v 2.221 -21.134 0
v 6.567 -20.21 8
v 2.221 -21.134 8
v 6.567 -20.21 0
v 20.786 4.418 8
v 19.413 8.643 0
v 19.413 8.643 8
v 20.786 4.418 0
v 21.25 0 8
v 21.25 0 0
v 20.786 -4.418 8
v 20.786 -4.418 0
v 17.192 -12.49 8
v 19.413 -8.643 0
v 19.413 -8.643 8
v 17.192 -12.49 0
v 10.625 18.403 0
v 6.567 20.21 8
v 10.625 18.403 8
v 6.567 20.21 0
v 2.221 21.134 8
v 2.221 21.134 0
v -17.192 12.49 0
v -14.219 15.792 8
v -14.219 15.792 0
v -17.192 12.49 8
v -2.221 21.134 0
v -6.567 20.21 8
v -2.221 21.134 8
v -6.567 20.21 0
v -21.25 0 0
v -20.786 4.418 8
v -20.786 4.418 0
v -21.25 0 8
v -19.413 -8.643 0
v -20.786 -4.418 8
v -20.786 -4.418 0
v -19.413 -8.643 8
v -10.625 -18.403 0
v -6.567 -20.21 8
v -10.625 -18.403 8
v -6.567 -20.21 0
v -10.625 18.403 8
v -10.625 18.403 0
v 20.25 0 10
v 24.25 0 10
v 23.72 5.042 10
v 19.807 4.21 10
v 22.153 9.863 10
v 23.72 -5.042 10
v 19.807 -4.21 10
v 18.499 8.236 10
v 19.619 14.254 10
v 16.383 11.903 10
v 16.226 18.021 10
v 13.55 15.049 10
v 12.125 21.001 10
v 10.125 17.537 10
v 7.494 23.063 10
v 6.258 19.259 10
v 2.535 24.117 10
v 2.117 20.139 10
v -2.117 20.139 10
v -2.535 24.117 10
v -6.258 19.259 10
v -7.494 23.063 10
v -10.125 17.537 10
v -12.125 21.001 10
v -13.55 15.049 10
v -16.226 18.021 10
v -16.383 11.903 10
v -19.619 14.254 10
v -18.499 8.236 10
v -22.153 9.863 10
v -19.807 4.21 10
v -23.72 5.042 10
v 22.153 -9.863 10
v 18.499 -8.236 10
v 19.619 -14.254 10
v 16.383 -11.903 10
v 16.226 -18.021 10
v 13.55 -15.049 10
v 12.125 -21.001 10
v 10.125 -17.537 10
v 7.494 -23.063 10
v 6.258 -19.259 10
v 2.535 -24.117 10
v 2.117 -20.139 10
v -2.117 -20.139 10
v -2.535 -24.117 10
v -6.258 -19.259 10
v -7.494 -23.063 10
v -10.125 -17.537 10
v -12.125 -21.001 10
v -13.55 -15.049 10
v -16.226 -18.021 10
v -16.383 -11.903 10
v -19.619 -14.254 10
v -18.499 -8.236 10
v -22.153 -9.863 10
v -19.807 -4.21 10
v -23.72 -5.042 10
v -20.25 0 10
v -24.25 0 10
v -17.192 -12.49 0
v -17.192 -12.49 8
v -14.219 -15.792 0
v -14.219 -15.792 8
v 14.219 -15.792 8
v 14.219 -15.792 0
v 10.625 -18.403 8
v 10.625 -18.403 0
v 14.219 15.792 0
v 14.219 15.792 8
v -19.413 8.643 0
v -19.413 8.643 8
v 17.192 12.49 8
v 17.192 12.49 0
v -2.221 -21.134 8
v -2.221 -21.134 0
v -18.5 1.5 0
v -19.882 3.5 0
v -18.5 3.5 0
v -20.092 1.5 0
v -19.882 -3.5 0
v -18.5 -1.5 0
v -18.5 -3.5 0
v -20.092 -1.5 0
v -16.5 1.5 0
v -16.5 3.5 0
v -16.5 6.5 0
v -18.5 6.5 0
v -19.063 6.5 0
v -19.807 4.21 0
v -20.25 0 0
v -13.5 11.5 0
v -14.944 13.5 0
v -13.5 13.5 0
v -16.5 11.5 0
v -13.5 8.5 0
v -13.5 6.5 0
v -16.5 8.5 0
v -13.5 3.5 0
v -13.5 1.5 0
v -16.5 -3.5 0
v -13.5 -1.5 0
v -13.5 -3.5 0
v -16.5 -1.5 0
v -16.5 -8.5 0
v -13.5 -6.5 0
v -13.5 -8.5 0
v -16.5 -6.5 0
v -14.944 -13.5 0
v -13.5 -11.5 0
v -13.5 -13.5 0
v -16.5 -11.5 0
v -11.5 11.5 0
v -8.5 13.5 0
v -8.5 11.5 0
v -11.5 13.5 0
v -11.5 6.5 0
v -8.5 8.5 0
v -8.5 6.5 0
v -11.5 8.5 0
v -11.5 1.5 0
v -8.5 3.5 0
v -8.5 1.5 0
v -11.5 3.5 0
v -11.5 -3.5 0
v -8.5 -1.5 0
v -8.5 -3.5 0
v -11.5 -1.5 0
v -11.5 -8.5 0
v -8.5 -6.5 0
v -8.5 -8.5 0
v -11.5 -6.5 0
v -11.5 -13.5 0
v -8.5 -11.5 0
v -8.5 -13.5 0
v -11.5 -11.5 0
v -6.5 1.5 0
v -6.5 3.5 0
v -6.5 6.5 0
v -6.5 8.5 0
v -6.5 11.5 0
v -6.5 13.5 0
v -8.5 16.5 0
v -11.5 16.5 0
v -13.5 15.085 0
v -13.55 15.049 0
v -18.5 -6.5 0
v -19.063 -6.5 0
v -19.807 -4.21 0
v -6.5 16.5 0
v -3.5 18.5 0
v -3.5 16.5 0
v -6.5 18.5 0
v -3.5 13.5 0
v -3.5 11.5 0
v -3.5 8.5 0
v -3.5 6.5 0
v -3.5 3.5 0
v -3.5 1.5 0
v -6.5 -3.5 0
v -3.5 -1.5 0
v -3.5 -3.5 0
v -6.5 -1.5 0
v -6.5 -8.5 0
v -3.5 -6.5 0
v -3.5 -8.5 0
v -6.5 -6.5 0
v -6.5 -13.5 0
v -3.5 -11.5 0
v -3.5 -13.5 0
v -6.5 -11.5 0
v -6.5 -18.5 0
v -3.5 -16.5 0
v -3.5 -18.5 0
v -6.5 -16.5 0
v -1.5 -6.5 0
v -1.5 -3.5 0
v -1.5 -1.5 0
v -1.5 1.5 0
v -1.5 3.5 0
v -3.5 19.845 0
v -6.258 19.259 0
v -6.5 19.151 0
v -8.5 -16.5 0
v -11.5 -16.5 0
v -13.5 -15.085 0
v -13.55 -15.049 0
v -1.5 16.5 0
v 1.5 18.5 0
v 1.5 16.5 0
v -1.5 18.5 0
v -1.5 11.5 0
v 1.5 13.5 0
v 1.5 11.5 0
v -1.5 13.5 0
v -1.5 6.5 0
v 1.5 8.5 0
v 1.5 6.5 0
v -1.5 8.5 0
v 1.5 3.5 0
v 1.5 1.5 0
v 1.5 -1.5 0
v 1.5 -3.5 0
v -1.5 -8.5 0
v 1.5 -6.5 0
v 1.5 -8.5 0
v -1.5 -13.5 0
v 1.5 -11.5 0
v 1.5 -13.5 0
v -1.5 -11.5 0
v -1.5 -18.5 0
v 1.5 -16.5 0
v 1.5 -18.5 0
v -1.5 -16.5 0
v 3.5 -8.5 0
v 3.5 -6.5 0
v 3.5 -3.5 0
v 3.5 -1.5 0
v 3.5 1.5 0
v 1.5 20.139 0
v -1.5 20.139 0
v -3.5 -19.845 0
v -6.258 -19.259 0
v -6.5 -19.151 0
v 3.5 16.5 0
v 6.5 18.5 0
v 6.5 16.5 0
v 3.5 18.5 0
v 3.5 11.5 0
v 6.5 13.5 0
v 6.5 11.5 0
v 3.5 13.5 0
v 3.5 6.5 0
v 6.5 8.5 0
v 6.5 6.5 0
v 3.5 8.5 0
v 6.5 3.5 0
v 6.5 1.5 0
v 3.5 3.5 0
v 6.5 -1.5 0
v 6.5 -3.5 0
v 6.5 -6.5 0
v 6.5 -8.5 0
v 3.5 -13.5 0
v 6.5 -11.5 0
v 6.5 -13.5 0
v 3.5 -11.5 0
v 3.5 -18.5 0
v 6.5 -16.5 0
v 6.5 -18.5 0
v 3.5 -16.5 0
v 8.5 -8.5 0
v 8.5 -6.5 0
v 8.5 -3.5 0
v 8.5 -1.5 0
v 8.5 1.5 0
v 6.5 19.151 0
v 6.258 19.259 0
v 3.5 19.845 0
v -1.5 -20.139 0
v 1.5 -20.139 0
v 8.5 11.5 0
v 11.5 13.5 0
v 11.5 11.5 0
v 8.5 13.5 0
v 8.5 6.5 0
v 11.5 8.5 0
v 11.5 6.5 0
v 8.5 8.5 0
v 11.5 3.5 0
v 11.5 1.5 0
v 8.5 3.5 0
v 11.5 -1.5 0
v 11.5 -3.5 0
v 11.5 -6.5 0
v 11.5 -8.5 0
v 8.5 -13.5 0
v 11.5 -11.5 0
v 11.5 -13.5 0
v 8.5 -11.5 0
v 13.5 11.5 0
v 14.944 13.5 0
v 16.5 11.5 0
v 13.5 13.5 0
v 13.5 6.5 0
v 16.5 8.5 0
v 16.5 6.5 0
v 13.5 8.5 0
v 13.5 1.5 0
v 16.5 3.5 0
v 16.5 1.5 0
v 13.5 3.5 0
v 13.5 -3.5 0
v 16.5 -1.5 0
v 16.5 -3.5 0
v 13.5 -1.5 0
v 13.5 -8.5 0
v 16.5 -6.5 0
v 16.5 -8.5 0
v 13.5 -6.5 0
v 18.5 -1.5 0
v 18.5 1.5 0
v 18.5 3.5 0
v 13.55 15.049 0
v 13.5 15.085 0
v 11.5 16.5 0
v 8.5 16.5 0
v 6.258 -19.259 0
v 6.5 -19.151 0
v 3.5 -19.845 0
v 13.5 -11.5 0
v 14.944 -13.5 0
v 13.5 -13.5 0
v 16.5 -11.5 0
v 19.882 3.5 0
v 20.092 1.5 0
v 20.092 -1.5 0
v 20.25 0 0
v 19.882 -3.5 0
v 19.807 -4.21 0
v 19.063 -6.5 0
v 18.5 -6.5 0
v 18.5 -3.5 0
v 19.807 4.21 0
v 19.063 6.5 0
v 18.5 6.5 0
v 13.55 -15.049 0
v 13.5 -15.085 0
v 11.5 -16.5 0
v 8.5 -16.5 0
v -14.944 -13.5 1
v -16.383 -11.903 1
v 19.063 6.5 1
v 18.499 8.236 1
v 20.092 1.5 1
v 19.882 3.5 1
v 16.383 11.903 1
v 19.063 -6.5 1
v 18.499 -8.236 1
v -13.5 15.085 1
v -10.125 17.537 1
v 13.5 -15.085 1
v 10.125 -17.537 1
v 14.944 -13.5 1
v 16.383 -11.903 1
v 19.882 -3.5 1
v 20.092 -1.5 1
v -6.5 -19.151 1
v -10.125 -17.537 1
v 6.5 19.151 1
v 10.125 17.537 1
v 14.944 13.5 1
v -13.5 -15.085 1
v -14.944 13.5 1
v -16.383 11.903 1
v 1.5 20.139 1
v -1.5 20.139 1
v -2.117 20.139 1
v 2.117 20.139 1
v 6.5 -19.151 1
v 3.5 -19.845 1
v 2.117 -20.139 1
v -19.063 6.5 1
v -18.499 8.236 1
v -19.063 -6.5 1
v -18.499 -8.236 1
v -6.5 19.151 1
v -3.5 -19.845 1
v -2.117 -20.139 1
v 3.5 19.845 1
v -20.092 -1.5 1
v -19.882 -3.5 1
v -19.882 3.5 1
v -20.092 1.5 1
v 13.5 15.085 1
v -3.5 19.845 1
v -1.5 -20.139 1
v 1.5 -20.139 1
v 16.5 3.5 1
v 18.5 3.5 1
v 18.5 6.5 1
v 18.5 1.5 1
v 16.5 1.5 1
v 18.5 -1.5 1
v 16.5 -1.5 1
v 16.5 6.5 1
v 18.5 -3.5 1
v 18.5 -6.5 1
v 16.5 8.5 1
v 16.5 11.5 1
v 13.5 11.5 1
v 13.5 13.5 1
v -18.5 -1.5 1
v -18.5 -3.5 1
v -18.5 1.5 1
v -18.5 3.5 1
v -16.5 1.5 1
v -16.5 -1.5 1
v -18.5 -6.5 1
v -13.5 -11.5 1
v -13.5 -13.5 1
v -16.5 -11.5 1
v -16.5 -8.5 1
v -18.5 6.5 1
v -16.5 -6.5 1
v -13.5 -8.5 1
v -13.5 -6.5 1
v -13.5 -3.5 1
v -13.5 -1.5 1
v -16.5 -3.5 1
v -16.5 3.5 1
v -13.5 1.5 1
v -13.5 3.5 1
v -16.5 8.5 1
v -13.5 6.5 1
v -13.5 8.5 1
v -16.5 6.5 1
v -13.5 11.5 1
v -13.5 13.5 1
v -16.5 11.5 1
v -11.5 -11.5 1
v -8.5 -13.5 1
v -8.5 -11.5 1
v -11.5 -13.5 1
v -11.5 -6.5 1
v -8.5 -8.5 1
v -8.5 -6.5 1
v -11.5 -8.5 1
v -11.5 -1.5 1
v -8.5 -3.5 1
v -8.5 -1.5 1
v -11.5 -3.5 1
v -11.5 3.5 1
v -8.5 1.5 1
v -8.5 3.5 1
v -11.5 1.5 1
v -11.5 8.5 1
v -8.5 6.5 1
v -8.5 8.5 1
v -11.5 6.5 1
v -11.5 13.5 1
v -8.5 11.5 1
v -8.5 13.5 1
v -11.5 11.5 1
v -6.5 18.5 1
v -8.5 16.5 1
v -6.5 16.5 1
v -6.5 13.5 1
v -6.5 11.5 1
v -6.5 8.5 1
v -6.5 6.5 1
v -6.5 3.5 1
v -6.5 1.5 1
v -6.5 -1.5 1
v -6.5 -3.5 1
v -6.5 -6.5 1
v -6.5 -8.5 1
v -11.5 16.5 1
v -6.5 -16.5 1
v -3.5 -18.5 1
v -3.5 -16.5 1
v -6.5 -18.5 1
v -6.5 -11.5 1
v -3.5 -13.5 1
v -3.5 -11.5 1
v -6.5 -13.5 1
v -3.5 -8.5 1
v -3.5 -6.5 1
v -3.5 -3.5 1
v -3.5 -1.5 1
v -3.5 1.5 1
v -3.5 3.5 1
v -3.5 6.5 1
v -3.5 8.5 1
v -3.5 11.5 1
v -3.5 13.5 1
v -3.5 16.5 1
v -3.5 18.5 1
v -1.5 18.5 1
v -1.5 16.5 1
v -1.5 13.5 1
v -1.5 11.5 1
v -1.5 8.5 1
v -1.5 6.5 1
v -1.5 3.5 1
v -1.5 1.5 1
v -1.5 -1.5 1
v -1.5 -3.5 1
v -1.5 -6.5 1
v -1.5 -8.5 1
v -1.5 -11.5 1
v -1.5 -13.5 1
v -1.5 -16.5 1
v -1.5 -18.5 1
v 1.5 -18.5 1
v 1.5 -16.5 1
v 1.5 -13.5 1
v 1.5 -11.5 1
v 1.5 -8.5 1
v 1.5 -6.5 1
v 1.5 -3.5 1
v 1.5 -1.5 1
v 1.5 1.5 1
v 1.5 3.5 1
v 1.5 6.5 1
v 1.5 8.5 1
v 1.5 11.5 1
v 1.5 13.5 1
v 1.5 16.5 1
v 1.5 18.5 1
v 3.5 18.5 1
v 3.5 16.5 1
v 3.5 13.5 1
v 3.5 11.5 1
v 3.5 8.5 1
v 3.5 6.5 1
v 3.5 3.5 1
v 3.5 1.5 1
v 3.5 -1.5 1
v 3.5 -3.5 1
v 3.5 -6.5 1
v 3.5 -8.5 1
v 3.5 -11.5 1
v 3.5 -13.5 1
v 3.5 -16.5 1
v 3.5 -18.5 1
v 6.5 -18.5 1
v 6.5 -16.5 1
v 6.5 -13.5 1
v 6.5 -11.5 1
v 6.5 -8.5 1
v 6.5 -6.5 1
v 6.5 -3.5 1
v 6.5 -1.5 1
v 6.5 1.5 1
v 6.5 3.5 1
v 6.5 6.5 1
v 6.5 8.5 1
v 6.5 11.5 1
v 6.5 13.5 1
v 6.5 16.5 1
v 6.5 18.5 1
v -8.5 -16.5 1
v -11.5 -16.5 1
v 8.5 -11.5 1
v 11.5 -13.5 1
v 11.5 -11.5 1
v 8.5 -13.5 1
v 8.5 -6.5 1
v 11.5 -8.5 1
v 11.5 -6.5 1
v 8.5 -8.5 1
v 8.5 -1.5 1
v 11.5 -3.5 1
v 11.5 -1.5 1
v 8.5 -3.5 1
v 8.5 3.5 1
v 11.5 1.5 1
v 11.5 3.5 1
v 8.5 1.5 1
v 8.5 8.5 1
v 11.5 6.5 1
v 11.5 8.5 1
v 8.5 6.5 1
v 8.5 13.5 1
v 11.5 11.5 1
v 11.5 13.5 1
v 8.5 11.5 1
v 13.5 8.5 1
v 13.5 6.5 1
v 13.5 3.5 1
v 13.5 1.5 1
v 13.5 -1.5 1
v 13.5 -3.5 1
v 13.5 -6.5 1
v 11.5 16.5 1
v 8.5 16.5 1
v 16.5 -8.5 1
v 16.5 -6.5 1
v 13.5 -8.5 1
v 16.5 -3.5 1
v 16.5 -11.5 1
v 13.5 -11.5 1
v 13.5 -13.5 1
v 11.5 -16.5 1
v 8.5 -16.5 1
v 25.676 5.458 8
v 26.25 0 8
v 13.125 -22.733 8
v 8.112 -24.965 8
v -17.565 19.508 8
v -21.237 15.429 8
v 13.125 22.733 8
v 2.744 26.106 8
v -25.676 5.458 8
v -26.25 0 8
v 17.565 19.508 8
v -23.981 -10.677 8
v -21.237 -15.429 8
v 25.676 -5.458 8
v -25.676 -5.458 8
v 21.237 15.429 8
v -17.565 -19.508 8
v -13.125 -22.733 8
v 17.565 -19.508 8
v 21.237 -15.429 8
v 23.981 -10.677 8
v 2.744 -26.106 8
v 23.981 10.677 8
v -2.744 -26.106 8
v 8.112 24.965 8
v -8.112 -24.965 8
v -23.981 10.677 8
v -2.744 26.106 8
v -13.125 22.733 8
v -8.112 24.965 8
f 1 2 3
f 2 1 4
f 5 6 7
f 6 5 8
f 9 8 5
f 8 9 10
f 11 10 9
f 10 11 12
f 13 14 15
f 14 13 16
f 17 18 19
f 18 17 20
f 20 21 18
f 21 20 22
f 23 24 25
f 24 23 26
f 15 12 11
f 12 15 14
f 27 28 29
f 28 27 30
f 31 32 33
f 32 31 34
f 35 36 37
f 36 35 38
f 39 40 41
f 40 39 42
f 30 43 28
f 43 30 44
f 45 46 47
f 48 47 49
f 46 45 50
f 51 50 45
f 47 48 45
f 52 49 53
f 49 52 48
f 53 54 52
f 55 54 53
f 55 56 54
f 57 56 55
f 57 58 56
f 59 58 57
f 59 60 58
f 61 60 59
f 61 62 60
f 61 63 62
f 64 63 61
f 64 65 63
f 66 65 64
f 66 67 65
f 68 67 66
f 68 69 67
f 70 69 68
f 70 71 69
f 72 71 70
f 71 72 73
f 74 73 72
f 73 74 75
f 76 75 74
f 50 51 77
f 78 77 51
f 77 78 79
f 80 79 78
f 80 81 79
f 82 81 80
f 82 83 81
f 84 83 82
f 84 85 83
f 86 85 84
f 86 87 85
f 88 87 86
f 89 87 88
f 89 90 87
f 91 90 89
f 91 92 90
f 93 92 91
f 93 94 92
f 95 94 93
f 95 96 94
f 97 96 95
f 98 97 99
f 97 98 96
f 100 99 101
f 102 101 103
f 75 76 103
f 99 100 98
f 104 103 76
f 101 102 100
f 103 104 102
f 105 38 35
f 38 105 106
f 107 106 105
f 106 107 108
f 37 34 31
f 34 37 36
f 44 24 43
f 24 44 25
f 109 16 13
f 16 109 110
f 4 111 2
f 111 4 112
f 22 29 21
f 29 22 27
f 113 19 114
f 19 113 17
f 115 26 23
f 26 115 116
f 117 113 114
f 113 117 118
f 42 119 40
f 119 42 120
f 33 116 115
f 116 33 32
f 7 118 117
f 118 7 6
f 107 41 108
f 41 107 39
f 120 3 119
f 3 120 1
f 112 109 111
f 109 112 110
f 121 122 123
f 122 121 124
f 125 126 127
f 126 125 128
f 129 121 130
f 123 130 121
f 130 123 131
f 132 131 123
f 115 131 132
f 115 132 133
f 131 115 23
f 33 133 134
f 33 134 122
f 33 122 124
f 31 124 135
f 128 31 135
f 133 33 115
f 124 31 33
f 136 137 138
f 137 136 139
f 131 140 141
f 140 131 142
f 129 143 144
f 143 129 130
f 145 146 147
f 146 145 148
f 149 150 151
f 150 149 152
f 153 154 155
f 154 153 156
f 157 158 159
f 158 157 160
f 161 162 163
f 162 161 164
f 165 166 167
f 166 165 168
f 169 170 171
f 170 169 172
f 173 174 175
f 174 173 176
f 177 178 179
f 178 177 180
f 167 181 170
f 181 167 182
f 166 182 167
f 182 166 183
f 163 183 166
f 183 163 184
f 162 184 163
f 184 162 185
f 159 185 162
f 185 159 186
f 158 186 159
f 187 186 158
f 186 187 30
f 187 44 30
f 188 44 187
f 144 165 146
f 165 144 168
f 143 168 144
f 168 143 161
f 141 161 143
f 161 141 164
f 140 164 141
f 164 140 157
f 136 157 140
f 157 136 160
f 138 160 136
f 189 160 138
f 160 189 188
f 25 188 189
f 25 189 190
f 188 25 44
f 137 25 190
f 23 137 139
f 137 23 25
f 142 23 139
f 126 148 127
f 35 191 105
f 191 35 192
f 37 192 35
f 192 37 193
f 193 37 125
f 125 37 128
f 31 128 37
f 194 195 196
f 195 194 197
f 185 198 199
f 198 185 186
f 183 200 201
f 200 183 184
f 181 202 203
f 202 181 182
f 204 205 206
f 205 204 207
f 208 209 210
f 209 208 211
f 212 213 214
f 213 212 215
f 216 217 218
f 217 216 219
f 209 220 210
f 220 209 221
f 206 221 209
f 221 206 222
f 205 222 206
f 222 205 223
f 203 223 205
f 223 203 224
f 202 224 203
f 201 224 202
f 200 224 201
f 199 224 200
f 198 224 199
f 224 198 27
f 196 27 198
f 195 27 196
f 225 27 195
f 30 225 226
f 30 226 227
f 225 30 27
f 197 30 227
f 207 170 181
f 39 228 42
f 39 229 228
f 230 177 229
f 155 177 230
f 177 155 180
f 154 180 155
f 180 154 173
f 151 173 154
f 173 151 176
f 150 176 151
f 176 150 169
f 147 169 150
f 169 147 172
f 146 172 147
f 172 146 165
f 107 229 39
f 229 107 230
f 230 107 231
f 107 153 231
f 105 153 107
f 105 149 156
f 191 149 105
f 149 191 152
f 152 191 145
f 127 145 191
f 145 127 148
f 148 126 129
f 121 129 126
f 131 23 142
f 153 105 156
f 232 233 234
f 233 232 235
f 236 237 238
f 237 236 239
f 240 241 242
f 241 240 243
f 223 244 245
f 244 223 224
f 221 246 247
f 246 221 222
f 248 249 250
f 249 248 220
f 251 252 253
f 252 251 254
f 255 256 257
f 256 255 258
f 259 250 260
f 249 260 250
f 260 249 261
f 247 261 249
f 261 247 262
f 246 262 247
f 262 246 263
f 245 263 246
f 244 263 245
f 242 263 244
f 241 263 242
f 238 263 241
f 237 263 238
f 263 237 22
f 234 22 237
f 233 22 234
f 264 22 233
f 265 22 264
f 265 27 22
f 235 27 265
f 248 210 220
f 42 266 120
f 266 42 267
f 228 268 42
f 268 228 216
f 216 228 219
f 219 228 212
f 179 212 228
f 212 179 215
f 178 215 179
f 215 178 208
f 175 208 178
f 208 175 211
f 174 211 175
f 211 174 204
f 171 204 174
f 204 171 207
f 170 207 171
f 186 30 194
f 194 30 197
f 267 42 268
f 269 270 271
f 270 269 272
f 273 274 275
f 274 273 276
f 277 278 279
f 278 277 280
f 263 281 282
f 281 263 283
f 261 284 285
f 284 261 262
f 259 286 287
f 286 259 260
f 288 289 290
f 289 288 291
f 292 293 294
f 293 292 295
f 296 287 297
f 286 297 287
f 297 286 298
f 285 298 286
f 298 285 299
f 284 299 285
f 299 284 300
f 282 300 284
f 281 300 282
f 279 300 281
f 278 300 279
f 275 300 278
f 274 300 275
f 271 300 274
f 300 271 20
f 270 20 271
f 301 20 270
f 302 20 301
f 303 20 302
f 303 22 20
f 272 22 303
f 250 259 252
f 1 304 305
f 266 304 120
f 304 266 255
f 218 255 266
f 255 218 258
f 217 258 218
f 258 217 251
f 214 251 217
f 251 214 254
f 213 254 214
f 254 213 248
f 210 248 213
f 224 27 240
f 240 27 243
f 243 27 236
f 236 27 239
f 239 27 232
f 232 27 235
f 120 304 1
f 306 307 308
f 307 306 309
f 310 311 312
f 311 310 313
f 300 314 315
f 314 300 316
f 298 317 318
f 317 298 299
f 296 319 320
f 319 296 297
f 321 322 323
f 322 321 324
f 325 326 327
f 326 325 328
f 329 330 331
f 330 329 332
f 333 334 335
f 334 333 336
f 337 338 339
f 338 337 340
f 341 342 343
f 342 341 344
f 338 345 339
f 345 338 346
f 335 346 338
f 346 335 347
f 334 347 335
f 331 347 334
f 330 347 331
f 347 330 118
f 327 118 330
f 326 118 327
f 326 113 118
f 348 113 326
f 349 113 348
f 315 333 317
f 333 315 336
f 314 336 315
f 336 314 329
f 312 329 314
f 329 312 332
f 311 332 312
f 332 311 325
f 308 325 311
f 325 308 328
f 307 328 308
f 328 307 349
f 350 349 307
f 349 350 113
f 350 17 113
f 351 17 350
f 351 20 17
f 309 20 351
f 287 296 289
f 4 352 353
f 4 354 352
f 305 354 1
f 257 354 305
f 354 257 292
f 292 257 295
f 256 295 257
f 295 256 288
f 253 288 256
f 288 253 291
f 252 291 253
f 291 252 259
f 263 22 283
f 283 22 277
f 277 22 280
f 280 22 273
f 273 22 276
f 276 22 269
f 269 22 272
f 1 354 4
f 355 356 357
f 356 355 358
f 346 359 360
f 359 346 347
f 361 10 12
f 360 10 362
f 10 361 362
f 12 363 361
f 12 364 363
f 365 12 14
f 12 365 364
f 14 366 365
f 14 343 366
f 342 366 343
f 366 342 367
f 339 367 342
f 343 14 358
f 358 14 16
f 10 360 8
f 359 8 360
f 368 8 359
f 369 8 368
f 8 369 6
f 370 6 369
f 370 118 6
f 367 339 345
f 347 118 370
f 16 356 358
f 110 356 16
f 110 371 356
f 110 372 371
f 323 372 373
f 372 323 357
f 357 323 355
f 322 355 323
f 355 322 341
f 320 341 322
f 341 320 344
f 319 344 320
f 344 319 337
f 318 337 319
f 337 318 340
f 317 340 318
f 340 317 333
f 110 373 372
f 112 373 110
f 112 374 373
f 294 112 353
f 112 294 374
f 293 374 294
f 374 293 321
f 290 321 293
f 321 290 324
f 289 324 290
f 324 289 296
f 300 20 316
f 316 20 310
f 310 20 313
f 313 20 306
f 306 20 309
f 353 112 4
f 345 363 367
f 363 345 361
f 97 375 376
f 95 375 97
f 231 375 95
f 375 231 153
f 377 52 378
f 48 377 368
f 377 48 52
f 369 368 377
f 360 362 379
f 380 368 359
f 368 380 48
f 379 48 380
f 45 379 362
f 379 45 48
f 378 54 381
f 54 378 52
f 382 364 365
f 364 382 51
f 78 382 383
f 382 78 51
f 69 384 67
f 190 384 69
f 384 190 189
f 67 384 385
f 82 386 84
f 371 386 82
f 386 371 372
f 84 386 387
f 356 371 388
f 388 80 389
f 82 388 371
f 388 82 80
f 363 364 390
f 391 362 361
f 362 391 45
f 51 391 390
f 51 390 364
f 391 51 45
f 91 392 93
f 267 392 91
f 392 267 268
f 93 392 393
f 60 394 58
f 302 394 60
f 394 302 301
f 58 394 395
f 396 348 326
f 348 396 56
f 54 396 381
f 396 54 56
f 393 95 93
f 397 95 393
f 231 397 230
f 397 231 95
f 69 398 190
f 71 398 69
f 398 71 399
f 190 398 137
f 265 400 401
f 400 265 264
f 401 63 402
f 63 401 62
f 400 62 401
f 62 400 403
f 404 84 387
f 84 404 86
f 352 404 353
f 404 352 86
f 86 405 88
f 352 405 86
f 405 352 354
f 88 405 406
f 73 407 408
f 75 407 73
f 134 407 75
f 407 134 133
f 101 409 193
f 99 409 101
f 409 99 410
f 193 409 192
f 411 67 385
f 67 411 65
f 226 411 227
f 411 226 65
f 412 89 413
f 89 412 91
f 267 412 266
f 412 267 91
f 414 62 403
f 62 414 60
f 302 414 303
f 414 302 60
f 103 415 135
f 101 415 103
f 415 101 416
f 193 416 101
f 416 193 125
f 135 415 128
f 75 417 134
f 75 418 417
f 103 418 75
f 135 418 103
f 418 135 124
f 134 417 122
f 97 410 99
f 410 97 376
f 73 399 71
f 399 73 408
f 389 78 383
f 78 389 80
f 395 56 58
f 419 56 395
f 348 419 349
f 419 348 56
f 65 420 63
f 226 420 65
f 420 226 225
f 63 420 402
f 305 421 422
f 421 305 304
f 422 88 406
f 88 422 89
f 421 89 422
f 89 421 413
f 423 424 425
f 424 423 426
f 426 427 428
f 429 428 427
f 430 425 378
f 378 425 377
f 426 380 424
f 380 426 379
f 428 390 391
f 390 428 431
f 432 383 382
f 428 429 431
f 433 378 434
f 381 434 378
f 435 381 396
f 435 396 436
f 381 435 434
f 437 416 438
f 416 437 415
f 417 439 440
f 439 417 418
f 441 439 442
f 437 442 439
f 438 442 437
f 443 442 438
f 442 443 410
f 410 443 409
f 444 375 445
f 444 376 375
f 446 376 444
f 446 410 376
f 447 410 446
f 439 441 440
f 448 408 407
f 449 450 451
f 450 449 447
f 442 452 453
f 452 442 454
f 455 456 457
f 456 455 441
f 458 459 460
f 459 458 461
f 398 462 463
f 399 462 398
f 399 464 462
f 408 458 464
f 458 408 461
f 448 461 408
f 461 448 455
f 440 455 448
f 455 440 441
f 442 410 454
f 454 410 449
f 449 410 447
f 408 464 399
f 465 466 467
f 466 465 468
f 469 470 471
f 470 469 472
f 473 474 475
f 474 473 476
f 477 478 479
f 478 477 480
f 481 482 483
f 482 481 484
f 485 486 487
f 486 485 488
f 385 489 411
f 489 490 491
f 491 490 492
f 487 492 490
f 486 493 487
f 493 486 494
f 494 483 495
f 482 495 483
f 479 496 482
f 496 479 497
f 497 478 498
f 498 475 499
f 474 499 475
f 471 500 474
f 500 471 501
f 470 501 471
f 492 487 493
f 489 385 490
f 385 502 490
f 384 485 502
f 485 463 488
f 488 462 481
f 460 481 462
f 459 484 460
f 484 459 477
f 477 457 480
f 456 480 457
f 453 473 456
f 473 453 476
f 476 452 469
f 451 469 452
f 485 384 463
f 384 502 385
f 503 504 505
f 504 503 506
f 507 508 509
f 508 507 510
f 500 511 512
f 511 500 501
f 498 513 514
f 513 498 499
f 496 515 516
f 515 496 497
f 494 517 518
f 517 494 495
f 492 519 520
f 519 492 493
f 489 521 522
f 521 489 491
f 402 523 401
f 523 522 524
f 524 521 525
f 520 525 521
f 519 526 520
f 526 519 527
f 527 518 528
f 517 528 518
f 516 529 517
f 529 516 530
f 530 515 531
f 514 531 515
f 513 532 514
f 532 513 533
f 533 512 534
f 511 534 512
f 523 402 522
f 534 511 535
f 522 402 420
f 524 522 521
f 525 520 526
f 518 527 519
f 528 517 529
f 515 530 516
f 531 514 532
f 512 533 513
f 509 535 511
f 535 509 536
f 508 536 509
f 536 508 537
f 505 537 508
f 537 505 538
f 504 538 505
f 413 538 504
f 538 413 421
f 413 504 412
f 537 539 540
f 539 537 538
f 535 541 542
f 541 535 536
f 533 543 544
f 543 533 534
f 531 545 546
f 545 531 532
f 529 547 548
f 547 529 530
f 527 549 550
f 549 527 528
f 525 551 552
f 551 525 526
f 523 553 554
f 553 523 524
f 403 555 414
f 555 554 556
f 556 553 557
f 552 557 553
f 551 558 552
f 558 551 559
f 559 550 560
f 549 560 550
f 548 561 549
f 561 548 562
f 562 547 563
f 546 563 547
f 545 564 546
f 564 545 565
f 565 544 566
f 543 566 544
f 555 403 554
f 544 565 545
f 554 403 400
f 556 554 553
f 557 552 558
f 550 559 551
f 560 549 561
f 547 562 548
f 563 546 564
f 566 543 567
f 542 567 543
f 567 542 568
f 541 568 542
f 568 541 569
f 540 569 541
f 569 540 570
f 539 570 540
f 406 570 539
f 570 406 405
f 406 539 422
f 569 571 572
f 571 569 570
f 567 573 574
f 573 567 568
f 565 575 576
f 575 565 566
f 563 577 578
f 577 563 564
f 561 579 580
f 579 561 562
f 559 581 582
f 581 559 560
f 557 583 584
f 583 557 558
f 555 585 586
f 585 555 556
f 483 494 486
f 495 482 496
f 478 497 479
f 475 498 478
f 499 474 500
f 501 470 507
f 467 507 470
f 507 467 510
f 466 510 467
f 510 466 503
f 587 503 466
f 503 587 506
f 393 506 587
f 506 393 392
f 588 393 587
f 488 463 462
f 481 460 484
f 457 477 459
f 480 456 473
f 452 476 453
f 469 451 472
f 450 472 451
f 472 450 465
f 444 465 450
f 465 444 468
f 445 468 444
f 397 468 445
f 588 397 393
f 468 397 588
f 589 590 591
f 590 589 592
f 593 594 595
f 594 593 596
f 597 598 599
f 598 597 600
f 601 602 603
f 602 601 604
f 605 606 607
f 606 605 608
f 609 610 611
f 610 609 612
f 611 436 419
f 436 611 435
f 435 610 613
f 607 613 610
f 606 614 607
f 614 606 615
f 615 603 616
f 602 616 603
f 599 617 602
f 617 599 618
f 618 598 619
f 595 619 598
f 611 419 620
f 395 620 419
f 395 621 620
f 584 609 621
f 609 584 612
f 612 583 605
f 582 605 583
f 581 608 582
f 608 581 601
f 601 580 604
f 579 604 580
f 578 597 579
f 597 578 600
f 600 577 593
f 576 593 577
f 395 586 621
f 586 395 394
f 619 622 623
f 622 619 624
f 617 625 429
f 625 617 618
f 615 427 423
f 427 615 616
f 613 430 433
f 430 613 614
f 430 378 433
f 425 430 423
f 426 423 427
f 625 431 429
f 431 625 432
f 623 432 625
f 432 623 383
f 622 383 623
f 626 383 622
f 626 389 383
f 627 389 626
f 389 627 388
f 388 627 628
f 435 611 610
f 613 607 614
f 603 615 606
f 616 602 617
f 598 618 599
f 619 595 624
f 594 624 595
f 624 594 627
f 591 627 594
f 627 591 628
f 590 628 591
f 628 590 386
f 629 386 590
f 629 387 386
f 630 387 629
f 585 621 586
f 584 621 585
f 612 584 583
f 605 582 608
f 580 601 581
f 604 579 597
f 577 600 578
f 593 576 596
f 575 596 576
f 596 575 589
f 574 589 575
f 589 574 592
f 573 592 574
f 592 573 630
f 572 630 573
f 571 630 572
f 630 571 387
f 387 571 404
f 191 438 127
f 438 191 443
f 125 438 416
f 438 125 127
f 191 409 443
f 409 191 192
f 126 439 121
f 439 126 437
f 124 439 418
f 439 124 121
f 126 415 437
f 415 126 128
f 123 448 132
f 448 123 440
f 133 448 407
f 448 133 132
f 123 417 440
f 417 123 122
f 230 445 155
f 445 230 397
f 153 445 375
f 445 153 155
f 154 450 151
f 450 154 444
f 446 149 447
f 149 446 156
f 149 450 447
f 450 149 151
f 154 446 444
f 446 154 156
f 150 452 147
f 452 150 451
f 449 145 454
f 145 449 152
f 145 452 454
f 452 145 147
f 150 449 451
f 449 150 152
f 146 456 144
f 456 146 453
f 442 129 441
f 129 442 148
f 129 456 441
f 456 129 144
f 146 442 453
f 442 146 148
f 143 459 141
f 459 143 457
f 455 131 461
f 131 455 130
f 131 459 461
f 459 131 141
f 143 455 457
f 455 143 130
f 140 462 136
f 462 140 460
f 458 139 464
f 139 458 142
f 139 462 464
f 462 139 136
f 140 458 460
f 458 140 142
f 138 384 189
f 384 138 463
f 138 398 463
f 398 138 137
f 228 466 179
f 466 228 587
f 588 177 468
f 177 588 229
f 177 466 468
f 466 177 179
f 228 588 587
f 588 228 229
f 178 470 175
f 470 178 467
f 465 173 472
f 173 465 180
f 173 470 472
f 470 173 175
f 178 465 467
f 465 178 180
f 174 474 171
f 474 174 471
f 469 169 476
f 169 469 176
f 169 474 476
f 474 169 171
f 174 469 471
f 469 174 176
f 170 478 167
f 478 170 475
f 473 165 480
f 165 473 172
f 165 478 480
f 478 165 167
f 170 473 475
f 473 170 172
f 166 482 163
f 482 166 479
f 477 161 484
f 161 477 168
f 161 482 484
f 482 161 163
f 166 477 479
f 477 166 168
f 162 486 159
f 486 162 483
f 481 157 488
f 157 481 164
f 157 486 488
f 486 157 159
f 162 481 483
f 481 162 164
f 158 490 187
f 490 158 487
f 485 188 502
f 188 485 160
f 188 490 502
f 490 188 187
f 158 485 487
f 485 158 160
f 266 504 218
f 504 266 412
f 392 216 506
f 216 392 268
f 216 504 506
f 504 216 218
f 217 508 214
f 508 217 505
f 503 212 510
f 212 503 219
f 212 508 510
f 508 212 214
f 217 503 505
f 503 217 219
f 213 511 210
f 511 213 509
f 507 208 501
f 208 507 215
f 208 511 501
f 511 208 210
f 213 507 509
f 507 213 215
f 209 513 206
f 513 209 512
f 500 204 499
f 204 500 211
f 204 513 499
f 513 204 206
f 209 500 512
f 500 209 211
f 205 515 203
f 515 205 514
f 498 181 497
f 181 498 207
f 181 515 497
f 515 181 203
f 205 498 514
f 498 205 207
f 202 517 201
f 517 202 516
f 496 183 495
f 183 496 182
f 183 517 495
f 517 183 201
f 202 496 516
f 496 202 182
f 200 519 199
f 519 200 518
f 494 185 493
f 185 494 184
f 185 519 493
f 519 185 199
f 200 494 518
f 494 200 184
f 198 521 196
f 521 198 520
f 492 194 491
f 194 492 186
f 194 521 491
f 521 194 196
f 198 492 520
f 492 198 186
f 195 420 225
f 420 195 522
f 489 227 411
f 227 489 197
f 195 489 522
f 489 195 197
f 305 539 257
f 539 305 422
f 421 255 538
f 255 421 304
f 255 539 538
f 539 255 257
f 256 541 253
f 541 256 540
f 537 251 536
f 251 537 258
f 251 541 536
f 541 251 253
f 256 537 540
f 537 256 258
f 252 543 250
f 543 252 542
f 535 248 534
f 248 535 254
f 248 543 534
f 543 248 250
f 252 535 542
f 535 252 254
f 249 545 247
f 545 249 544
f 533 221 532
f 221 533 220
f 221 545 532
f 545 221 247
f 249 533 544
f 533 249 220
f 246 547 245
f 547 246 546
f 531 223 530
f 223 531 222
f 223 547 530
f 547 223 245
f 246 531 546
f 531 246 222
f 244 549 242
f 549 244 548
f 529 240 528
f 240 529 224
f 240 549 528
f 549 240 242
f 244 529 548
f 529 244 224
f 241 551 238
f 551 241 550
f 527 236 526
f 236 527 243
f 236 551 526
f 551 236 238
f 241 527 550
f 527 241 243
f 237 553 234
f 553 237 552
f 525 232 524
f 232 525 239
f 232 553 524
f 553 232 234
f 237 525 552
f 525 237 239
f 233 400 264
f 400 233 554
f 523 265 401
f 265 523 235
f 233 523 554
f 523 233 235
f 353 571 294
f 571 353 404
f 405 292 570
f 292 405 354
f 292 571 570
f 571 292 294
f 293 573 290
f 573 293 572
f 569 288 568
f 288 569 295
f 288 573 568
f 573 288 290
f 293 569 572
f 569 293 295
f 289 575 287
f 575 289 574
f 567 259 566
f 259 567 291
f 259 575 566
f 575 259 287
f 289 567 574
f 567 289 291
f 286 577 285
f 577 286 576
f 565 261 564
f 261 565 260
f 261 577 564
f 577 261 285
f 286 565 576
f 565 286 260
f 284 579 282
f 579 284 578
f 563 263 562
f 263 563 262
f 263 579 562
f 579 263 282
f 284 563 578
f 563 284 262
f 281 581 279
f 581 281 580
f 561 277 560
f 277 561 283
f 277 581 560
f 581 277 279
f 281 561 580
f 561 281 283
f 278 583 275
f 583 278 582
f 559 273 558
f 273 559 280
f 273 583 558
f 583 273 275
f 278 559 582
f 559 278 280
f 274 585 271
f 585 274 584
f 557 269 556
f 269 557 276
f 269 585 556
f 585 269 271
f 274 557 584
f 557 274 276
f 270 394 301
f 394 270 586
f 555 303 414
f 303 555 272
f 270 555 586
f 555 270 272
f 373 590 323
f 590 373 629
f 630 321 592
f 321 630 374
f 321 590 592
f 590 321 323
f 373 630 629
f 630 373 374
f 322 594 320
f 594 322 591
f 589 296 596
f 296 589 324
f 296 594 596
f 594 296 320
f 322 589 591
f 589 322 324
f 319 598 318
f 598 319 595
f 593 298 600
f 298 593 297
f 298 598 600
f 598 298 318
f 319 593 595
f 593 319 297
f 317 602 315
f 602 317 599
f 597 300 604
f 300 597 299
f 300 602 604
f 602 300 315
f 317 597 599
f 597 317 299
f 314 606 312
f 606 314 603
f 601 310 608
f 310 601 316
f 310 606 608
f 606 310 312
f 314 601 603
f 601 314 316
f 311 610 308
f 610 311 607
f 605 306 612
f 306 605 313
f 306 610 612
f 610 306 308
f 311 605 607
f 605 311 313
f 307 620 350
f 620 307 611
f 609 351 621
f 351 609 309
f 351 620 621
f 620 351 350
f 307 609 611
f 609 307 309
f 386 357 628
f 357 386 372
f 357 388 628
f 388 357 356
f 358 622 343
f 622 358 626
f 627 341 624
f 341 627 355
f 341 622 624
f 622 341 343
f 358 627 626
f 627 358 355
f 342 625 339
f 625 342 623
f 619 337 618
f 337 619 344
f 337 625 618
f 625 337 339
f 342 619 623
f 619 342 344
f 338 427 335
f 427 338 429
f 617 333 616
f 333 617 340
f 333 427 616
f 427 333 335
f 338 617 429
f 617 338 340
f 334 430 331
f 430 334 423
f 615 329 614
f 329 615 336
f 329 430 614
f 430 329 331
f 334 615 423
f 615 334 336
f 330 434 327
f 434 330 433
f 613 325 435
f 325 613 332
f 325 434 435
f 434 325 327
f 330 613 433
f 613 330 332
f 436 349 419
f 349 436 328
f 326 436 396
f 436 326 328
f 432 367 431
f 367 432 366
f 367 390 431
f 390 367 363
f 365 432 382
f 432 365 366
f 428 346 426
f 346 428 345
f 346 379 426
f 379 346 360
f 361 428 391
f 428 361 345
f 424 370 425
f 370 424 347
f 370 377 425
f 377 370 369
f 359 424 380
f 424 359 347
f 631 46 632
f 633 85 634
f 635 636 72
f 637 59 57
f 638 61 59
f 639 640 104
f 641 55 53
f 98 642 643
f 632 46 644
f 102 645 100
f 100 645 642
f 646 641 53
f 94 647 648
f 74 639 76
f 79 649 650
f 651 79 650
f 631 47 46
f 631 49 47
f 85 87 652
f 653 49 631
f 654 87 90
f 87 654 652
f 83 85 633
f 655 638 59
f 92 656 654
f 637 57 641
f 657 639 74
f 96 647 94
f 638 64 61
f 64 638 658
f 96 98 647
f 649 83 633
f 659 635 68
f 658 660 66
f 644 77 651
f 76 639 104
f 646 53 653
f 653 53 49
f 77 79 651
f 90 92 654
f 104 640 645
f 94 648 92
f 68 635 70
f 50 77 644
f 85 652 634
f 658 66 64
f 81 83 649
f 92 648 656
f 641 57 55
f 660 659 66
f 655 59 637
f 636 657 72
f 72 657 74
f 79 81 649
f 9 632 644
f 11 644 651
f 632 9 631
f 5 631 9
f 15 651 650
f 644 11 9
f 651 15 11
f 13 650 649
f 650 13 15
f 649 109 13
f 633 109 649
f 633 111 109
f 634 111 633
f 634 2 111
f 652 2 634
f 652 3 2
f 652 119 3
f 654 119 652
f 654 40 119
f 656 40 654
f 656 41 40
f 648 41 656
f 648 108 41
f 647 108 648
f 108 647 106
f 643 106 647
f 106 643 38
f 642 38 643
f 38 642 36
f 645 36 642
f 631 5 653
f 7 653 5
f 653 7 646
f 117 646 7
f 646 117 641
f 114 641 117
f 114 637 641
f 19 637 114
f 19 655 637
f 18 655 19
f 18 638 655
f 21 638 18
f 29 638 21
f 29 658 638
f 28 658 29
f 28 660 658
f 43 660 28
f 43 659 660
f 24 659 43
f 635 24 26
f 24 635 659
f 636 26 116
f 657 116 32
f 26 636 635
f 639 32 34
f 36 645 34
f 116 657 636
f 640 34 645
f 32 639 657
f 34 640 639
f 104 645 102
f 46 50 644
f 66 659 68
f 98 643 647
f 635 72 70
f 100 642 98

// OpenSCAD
// Drain Strainer
// by Nathan Wittstock <nate@fardog.io>

// preview[view: south east, tilt: top diagonal]

/* [Strainer] */
strainer_type = "square"; // [square: Square,circle: Circle]
strainer_x_mm = 3.0; //[1.0:10.0]
strainer_y_mm = 3.0; //[1.0:10.0]
strainer_thickness_mm = 1.0; //[1.0:3.0]
strainer_grid_spacing_mm = 2.0; //[0.5:3.0]

/* [Drain] */
drain_diameter_mm = 42.5; //[5.0:150.0]
drain_depth_mm = 10.0; //[0.0:50.0]
drain_sleeve_thickness = 1.0; //[0.5:3.0]

/* [Skirt] */
skirt_diameter_mm = 52.5; //[5.0:200.0]
skirt_upper_diameter_mm = 48.5; //[5.0:200.0]
skirt_thickness_mm = 2.0; //[1.0:3.0]

/* [Hidden] */
skirt_z_offset = drain_depth_mm - skirt_thickness_mm;
circle_strainer_resolution = 10;
drain_sleeve_difference = drain_sleeve_thickness * 2;

module drain_sleeve() {
    difference() {
        cylinder(h=drain_depth_mm, d=drain_diameter_mm);
        cylinder(h=drain_depth_mm, d=drain_diameter_mm-drain_sleeve_difference);
    }
}

module strainer_square() {
    x_size = strainer_x_mm + strainer_grid_spacing_mm;
    x_total = ceil(drain_diameter_mm / x_size) * x_size;
    x_offset = (x_total - strainer_grid_spacing_mm) / 2;
    y_size = strainer_y_mm + strainer_grid_spacing_mm;
    y_total = ceil(drain_diameter_mm / y_size) * y_size;
    y_offset = (y_total - strainer_grid_spacing_mm) / 2;

    translate([-x_offset, -y_offset, 0]) {
        for (x = [0:x_size:drain_diameter_mm]) {
            translate([x,0,0])
            for (y = [0:y_size:drain_diameter_mm]) {
                translate([0, y, 0])
                    cube([strainer_x_mm, strainer_y_mm, strainer_thickness_mm]);
            }
        }
    }
}

module strainer_circle() {
    x_size = strainer_x_mm + strainer_grid_spacing_mm;
    x_total = ceil(drain_diameter_mm / x_size) * x_size;
    x_offset = (x_total) / 2;
    y_size = strainer_y_mm + strainer_grid_spacing_mm;
    y_total = ceil(drain_diameter_mm / y_size) * y_size;
    y_offset = (y_total) / 2;

    translate([-x_offset, -y_offset, 0]) {
        for (x = [0:x_size:drain_diameter_mm]) {
            translate([x,0,0])
            for (y = [0:y_size:drain_diameter_mm]) {
                translate([0, y, 0])
                    cylinder(h=strainer_thickness_mm, d=strainer_x_mm, $fn=circle_strainer_resolution);
            }
        }
    }
}

module strainer() {
    union() {
        difference() {
            cylinder(h=strainer_thickness_mm, d=drain_diameter_mm);
            cylinder(h=strainer_thickness_mm, d=drain_diameter_mm-drain_sleeve_difference);
        }
        difference() {
            cylinder(h=strainer_thickness_mm, d=drain_diameter_mm);

            if (strainer_type == "square") {
                strainer_square();
            } else if (strainer_type == "circle") {
                strainer_circle();
            }
        }
    }
}

module skirt() {
    difference() {
        cylinder(h=skirt_thickness_mm, d1=skirt_diameter_mm, d2=skirt_upper_diameter_mm);
        cylinder(h=skirt_thickness_mm, d=drain_diameter_mm);
    }
}

union() {
    drain_sleeve();
    strainer();
    translate([0, 0, skirt_z_offset])
        skirt();
}
